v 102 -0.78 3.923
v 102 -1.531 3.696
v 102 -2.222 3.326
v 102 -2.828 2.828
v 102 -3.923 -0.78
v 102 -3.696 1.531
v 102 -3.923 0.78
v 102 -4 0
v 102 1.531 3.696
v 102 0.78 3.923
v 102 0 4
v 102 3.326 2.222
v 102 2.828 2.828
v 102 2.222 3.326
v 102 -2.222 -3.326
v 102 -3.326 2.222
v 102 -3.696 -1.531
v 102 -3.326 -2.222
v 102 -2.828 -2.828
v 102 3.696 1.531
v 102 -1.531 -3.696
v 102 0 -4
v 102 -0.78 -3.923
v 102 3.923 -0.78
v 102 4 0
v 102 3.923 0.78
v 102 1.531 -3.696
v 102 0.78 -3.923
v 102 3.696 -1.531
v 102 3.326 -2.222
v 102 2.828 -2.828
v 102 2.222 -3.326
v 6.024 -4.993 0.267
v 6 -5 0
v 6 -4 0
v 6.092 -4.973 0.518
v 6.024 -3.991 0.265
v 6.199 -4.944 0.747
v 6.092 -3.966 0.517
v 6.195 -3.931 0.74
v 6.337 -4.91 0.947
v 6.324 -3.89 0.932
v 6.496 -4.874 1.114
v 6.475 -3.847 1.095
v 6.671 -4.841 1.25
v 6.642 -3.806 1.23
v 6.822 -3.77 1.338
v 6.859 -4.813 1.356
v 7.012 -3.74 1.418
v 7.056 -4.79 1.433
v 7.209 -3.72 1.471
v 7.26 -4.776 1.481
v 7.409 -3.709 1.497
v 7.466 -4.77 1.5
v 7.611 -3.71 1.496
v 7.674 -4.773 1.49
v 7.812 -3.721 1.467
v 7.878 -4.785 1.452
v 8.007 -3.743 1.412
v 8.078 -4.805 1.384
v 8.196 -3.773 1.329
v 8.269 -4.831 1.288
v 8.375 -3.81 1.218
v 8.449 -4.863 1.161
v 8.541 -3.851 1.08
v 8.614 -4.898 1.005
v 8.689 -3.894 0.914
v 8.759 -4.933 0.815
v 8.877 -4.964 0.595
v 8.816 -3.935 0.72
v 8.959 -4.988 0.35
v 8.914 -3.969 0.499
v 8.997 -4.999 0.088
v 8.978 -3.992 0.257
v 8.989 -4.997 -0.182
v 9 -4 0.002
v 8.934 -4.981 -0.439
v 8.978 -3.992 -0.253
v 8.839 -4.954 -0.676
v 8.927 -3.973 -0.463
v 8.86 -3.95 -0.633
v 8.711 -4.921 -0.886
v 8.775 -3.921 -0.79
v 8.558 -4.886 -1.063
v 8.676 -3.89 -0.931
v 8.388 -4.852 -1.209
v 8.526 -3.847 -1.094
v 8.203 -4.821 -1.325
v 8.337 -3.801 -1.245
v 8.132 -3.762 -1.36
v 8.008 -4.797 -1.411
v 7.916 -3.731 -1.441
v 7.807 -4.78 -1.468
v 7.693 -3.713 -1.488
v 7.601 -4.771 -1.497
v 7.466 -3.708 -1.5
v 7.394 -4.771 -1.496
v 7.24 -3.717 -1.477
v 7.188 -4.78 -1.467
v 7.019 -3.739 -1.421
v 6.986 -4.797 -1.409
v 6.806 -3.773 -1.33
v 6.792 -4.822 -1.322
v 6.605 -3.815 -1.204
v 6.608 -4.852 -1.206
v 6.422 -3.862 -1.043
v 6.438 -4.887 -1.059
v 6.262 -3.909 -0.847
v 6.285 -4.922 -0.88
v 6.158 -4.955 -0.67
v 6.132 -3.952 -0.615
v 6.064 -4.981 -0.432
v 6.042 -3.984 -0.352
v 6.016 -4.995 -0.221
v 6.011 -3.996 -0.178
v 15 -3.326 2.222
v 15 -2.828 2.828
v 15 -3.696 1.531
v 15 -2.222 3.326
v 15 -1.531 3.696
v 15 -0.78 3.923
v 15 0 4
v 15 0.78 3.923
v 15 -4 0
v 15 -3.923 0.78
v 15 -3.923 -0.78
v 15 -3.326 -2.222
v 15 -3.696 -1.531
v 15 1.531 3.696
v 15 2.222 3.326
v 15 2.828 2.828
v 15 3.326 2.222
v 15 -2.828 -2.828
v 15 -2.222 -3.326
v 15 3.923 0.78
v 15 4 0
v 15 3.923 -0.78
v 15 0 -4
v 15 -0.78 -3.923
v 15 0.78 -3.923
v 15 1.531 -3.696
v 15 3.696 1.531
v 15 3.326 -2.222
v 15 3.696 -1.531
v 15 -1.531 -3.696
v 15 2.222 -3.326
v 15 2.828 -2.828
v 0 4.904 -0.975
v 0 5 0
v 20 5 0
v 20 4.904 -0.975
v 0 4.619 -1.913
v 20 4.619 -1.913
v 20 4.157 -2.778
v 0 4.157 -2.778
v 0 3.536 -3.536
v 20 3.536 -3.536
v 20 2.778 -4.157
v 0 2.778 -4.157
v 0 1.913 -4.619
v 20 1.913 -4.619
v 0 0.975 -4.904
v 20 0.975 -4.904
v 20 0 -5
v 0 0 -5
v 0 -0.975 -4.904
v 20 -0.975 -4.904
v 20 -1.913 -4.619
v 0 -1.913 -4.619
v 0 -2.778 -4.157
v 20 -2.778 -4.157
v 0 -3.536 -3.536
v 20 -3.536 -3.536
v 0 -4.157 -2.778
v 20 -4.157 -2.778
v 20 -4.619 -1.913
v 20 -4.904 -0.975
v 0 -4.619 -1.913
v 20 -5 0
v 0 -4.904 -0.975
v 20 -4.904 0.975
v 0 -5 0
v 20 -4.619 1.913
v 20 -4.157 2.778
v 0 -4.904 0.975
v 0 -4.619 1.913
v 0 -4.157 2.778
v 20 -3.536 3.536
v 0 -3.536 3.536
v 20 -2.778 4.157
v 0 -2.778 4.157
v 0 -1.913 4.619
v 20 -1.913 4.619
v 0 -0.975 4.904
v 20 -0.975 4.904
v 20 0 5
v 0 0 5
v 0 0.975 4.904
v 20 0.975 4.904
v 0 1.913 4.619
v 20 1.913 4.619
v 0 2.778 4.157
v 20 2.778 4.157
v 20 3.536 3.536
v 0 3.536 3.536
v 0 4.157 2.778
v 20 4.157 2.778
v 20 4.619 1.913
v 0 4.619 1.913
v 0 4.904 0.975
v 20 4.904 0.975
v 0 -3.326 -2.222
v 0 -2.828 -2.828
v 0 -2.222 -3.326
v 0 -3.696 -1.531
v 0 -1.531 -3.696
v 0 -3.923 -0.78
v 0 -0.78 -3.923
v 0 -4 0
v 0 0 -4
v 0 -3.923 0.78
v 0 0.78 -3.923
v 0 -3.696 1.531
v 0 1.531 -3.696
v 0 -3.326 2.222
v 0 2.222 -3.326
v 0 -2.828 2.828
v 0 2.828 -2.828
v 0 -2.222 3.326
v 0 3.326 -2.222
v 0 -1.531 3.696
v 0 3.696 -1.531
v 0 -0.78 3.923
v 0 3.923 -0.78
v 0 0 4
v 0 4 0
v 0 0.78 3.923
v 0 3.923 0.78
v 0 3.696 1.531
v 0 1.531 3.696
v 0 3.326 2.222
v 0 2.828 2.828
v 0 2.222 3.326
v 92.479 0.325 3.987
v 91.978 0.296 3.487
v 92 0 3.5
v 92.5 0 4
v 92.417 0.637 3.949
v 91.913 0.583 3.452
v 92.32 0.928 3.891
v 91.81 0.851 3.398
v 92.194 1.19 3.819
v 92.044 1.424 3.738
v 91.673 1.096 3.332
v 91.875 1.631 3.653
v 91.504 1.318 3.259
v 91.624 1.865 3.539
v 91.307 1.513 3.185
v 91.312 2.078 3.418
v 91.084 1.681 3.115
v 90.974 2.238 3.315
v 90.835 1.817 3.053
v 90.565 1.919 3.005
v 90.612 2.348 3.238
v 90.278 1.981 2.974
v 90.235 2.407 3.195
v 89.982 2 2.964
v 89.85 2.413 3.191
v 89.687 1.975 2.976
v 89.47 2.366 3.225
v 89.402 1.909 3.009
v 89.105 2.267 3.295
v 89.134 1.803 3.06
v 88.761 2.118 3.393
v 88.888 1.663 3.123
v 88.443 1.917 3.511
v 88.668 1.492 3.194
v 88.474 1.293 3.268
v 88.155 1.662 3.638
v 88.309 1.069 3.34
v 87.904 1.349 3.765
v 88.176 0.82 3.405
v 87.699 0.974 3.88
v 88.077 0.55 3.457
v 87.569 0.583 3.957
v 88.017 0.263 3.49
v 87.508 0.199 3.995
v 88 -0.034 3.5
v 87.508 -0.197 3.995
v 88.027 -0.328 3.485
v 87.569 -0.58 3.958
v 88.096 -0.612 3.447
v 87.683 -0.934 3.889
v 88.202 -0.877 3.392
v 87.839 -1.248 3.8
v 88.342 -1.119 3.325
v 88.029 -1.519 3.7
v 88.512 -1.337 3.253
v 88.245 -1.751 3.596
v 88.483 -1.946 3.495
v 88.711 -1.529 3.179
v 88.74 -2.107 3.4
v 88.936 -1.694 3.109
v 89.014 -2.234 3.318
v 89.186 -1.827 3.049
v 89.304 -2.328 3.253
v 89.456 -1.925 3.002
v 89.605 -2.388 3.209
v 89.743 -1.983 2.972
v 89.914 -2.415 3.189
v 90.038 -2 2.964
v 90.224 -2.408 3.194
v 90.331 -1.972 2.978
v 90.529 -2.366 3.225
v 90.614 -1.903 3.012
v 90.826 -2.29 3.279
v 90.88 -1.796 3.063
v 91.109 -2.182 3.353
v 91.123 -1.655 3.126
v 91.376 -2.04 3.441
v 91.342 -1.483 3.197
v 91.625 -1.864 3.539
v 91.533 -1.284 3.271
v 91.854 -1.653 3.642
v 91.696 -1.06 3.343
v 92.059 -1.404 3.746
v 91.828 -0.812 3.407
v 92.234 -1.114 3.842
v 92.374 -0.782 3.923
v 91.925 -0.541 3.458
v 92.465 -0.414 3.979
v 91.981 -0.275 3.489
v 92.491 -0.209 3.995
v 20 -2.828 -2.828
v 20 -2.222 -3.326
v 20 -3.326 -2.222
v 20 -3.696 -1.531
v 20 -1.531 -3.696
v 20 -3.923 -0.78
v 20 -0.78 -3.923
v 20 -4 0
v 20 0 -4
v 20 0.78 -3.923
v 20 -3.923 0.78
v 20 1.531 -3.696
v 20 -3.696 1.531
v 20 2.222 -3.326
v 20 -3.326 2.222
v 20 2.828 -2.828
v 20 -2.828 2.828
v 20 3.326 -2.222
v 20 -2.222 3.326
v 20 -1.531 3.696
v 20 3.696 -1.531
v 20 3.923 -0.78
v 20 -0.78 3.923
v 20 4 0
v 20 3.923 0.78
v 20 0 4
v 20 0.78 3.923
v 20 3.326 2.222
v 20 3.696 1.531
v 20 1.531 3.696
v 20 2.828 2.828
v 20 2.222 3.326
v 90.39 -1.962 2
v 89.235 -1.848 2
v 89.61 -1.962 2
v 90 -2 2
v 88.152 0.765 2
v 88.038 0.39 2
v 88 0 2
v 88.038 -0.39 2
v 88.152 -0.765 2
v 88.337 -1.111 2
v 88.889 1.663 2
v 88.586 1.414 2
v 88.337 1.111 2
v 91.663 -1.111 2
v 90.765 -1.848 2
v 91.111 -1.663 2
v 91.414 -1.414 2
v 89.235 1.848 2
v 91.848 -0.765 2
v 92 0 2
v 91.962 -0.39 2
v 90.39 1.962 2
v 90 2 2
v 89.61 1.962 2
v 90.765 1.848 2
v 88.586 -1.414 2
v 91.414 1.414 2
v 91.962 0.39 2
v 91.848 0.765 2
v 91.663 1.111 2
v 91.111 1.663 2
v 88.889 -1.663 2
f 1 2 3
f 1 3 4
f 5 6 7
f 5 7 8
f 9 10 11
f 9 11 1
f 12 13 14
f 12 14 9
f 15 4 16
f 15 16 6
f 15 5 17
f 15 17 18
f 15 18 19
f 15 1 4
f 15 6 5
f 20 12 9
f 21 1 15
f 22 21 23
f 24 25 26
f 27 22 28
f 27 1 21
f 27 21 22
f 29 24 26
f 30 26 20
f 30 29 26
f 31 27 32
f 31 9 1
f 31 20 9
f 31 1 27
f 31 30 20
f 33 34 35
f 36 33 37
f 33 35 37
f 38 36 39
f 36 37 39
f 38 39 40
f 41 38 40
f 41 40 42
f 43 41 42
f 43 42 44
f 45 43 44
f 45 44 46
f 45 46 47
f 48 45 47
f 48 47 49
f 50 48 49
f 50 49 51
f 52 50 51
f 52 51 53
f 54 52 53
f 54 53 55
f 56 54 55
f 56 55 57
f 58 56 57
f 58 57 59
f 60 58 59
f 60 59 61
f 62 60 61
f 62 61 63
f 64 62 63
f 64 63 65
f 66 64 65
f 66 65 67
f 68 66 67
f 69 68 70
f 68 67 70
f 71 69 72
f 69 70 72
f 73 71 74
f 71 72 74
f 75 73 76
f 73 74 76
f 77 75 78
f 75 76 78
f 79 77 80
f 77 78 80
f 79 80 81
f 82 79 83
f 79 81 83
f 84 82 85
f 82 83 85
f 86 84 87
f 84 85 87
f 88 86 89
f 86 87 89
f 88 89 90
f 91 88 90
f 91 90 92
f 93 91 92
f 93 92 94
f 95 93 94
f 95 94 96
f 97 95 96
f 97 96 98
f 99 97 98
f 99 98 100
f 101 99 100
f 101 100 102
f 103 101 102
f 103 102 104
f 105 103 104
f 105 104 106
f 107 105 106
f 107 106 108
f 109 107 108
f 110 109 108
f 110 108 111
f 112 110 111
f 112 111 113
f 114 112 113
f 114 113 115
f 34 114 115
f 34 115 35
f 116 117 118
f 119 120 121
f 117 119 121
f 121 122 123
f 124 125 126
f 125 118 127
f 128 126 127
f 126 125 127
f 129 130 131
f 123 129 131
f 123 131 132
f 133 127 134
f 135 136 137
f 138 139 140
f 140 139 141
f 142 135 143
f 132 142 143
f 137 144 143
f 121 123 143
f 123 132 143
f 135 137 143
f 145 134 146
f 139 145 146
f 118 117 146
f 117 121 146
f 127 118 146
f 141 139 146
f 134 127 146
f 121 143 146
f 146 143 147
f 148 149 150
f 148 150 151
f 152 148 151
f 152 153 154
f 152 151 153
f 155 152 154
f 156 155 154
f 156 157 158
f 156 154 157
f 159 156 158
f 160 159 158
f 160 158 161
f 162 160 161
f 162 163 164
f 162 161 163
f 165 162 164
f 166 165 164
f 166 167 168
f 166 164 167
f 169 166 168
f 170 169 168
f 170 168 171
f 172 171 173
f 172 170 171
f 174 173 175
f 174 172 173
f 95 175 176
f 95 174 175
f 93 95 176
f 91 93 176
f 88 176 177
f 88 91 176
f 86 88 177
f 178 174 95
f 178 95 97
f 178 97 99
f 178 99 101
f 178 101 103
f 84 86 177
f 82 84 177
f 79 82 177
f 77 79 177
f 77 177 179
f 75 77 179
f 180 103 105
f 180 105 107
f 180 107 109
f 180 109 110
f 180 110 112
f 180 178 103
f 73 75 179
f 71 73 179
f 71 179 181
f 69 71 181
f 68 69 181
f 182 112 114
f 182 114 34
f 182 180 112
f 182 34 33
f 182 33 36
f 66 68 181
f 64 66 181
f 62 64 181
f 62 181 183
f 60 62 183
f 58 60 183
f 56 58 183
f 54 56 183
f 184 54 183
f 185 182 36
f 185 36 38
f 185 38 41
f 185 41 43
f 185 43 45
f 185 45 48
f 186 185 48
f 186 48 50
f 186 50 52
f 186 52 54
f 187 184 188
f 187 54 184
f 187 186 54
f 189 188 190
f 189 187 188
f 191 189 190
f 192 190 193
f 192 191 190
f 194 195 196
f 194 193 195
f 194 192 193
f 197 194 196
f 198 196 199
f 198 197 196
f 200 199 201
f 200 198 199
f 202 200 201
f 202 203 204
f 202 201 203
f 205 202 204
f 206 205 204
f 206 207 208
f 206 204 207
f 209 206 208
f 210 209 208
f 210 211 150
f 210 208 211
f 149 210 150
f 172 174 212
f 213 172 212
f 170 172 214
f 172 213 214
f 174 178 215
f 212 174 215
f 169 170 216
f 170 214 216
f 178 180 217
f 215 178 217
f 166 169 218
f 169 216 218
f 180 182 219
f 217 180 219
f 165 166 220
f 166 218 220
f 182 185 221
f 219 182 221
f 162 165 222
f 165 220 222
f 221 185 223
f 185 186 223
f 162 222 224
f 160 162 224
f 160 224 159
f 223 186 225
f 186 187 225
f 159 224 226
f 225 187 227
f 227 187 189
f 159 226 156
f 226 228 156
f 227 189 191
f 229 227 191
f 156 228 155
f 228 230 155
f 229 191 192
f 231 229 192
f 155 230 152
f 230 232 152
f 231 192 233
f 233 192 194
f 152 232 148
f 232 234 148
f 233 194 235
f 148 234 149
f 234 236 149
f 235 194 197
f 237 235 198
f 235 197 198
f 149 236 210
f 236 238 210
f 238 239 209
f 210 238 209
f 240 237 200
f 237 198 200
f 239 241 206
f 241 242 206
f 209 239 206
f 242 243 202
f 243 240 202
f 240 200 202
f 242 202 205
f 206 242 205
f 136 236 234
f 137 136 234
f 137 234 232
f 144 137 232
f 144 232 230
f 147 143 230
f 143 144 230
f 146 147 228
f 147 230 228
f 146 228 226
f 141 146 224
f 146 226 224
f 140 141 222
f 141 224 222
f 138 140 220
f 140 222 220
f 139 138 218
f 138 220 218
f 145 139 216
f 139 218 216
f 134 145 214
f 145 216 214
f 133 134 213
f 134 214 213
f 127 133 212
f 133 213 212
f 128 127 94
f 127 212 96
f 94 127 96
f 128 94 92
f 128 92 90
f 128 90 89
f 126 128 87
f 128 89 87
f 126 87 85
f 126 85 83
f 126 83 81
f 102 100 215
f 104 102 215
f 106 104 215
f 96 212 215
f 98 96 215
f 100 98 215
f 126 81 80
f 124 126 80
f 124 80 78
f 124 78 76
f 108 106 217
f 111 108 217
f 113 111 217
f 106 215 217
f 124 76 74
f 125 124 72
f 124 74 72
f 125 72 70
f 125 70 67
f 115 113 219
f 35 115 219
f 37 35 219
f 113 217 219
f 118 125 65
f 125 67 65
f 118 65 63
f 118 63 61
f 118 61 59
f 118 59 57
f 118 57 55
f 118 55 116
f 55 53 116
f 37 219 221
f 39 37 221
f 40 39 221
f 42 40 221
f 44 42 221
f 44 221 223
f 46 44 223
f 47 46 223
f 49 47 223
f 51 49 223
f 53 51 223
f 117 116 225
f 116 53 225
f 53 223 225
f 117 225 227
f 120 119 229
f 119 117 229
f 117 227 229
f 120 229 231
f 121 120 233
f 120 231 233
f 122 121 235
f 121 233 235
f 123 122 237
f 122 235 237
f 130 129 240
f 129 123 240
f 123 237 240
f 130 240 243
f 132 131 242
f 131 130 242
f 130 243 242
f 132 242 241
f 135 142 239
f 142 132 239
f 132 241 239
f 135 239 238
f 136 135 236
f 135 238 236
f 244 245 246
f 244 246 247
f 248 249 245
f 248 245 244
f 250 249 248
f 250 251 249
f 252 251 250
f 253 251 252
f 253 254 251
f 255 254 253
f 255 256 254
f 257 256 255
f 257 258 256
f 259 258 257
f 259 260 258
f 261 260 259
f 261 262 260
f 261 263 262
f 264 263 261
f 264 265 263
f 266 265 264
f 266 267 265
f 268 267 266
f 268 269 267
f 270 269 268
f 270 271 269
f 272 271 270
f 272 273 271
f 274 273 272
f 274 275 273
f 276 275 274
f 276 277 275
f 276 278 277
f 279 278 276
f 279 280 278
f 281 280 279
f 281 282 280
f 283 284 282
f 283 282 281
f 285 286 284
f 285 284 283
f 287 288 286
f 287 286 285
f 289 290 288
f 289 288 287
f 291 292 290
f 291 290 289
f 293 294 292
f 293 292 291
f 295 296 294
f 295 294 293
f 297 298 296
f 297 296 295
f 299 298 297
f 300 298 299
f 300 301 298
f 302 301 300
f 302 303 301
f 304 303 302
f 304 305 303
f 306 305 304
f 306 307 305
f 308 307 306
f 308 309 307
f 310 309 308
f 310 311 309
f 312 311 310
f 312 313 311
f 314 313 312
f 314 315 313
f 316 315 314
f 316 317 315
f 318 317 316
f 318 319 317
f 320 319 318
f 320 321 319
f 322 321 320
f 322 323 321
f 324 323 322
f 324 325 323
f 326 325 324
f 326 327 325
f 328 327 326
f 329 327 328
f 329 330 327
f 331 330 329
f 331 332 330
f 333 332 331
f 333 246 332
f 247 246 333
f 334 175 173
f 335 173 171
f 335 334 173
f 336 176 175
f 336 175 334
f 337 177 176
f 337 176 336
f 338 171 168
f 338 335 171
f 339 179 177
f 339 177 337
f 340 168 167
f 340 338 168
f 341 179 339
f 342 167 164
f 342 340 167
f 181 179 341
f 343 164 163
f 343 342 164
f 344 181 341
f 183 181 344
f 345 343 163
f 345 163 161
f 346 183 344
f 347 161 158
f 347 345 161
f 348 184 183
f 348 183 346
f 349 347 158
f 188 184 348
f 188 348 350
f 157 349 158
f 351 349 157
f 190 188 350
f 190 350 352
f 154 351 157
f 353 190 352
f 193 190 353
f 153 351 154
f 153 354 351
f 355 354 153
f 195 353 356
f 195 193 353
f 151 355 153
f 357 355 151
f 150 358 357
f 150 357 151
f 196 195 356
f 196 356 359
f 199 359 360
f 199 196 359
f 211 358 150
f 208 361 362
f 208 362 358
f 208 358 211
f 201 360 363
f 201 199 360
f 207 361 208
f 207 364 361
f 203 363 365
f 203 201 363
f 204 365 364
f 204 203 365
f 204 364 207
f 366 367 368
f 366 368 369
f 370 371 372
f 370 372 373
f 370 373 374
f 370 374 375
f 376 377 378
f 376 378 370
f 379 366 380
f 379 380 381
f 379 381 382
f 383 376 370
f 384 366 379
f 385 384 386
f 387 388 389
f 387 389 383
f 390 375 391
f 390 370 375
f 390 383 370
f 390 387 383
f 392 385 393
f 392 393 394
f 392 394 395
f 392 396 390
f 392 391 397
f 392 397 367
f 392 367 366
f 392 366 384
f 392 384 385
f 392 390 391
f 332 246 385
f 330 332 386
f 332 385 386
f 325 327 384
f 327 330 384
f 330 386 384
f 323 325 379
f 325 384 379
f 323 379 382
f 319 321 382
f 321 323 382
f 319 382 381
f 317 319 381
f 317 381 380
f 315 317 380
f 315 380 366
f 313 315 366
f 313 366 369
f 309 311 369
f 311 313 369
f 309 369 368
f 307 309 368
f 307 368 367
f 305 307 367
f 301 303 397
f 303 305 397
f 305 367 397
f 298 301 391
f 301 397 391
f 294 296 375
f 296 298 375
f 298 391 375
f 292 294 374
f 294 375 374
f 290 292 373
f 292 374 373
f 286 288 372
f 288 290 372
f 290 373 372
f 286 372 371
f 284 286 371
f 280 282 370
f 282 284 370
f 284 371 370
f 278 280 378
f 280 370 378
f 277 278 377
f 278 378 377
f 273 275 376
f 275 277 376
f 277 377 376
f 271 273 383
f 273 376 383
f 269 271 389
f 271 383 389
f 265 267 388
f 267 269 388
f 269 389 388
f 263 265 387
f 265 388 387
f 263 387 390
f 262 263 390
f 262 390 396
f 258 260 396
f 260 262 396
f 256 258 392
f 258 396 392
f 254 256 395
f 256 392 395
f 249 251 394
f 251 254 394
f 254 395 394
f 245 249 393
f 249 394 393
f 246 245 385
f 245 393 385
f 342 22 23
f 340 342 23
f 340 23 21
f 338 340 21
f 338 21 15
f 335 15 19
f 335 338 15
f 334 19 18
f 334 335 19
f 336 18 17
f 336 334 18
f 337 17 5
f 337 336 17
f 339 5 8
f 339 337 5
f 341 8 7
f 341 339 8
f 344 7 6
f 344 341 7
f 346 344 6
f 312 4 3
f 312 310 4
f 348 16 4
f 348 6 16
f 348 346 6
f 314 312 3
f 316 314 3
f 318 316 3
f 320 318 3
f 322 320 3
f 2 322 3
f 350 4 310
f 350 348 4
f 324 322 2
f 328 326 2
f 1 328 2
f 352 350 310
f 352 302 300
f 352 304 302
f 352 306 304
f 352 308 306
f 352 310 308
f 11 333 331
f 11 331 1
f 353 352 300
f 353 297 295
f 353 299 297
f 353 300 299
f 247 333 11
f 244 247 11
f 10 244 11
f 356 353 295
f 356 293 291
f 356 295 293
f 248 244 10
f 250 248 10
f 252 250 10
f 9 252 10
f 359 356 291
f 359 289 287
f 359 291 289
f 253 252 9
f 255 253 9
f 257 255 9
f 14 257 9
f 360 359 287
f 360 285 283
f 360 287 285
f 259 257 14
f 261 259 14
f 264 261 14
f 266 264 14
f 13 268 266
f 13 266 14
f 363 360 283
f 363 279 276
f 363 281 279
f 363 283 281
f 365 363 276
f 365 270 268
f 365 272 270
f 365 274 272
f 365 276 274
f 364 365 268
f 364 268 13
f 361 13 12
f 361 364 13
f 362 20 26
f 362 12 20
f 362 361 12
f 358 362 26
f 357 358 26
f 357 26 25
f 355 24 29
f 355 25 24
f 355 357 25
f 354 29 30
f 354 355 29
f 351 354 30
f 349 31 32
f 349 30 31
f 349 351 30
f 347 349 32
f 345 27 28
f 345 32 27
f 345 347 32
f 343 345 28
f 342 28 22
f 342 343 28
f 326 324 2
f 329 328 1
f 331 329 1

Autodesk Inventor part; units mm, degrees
ref_plane "YZ Plane" through (0, 0, 0) normal (1, 0, 0) x (0, 1, 0)
ref_plane "XZ Plane" through (0, 0, 0) normal (0, 1, 0) x (-1, 0, 0)
sketch "Sketch1" plane through (0, 0, 0) normal (1, 0, 0) x (0, 1, 0)
  circle A0 centre (0, 0) radius 4
  circle A1 centre (0, 0) radius 5
  dimension "d0" = 8
  dimension "d1" = 10
extrude "Extrusion1" add sketch "Sketch1" along normal blind 20
ref_plane "Work Plane1" through (15, 0, 0) normal (1, 0, 0) x (0, 0, -1)
sketch "Sketch2" plane through (15, 0, 0) normal (1, 0, 0) x (0, 0, -1)
  circle A0 centre (0, 0) radius 4
extrude "Extrusion2" add sketch "Sketch2" along normal blind 85
sketch "Sketch3" plane through (0, 0, 0) normal (0, 1, 0) x (-1, 0, 0)
  line L0 (0, 0) -> (-7.5, 0)
  circle A0 centre (-7.5, 0) radius 1.5
  dimension "d7" = 7.5
  dimension "d8" = 3
extrude "Extrusion3" cut sketch "Sketch3" against normal blind 60
thread "Thread1" size "M3x0.5" class "6H" standard "ANSI Metric M Profile" length 70
sketch "Sketch4" plane through (0, 0, 0) normal (0, 0, 1) x (1, 0, 0)
  line L0 (100, -4) -> (100, 4) projected
  line L1 (100, 0) -> (90, 0)
  circle A0 centre (90, 0) radius 2
  point P0 (0, 0)
  dimension "d13" = 10
  dimension "d14" = 4
extrude "Extrusion4" cut sketch "Sketch4" along normal blind 10
sketch "Sketch5" plane through (90, 0, 0) normal (0, 0, 1) x (1, 0, 0)
  circle A0 centre (0, 0) radius 2
  point P0 (-90, 0)
extrude "Extrusion5" add sketch "Sketch5" along normal blind 2
chamfer "Chamfer1" distance 0.5 angle 45 1 edges at (88.0001, -0.0148, 4)
sketch "Sketch6" plane through (100, 0, 0) normal (1, 0, 0) x (0, 0, -1)
  circle A0 centre (0, 0) radius 4
extrude "Extrusion6" add sketch "Sketch6" along normal blind 2
properties part number "4x2020_axis" material "Stainless Steel"
